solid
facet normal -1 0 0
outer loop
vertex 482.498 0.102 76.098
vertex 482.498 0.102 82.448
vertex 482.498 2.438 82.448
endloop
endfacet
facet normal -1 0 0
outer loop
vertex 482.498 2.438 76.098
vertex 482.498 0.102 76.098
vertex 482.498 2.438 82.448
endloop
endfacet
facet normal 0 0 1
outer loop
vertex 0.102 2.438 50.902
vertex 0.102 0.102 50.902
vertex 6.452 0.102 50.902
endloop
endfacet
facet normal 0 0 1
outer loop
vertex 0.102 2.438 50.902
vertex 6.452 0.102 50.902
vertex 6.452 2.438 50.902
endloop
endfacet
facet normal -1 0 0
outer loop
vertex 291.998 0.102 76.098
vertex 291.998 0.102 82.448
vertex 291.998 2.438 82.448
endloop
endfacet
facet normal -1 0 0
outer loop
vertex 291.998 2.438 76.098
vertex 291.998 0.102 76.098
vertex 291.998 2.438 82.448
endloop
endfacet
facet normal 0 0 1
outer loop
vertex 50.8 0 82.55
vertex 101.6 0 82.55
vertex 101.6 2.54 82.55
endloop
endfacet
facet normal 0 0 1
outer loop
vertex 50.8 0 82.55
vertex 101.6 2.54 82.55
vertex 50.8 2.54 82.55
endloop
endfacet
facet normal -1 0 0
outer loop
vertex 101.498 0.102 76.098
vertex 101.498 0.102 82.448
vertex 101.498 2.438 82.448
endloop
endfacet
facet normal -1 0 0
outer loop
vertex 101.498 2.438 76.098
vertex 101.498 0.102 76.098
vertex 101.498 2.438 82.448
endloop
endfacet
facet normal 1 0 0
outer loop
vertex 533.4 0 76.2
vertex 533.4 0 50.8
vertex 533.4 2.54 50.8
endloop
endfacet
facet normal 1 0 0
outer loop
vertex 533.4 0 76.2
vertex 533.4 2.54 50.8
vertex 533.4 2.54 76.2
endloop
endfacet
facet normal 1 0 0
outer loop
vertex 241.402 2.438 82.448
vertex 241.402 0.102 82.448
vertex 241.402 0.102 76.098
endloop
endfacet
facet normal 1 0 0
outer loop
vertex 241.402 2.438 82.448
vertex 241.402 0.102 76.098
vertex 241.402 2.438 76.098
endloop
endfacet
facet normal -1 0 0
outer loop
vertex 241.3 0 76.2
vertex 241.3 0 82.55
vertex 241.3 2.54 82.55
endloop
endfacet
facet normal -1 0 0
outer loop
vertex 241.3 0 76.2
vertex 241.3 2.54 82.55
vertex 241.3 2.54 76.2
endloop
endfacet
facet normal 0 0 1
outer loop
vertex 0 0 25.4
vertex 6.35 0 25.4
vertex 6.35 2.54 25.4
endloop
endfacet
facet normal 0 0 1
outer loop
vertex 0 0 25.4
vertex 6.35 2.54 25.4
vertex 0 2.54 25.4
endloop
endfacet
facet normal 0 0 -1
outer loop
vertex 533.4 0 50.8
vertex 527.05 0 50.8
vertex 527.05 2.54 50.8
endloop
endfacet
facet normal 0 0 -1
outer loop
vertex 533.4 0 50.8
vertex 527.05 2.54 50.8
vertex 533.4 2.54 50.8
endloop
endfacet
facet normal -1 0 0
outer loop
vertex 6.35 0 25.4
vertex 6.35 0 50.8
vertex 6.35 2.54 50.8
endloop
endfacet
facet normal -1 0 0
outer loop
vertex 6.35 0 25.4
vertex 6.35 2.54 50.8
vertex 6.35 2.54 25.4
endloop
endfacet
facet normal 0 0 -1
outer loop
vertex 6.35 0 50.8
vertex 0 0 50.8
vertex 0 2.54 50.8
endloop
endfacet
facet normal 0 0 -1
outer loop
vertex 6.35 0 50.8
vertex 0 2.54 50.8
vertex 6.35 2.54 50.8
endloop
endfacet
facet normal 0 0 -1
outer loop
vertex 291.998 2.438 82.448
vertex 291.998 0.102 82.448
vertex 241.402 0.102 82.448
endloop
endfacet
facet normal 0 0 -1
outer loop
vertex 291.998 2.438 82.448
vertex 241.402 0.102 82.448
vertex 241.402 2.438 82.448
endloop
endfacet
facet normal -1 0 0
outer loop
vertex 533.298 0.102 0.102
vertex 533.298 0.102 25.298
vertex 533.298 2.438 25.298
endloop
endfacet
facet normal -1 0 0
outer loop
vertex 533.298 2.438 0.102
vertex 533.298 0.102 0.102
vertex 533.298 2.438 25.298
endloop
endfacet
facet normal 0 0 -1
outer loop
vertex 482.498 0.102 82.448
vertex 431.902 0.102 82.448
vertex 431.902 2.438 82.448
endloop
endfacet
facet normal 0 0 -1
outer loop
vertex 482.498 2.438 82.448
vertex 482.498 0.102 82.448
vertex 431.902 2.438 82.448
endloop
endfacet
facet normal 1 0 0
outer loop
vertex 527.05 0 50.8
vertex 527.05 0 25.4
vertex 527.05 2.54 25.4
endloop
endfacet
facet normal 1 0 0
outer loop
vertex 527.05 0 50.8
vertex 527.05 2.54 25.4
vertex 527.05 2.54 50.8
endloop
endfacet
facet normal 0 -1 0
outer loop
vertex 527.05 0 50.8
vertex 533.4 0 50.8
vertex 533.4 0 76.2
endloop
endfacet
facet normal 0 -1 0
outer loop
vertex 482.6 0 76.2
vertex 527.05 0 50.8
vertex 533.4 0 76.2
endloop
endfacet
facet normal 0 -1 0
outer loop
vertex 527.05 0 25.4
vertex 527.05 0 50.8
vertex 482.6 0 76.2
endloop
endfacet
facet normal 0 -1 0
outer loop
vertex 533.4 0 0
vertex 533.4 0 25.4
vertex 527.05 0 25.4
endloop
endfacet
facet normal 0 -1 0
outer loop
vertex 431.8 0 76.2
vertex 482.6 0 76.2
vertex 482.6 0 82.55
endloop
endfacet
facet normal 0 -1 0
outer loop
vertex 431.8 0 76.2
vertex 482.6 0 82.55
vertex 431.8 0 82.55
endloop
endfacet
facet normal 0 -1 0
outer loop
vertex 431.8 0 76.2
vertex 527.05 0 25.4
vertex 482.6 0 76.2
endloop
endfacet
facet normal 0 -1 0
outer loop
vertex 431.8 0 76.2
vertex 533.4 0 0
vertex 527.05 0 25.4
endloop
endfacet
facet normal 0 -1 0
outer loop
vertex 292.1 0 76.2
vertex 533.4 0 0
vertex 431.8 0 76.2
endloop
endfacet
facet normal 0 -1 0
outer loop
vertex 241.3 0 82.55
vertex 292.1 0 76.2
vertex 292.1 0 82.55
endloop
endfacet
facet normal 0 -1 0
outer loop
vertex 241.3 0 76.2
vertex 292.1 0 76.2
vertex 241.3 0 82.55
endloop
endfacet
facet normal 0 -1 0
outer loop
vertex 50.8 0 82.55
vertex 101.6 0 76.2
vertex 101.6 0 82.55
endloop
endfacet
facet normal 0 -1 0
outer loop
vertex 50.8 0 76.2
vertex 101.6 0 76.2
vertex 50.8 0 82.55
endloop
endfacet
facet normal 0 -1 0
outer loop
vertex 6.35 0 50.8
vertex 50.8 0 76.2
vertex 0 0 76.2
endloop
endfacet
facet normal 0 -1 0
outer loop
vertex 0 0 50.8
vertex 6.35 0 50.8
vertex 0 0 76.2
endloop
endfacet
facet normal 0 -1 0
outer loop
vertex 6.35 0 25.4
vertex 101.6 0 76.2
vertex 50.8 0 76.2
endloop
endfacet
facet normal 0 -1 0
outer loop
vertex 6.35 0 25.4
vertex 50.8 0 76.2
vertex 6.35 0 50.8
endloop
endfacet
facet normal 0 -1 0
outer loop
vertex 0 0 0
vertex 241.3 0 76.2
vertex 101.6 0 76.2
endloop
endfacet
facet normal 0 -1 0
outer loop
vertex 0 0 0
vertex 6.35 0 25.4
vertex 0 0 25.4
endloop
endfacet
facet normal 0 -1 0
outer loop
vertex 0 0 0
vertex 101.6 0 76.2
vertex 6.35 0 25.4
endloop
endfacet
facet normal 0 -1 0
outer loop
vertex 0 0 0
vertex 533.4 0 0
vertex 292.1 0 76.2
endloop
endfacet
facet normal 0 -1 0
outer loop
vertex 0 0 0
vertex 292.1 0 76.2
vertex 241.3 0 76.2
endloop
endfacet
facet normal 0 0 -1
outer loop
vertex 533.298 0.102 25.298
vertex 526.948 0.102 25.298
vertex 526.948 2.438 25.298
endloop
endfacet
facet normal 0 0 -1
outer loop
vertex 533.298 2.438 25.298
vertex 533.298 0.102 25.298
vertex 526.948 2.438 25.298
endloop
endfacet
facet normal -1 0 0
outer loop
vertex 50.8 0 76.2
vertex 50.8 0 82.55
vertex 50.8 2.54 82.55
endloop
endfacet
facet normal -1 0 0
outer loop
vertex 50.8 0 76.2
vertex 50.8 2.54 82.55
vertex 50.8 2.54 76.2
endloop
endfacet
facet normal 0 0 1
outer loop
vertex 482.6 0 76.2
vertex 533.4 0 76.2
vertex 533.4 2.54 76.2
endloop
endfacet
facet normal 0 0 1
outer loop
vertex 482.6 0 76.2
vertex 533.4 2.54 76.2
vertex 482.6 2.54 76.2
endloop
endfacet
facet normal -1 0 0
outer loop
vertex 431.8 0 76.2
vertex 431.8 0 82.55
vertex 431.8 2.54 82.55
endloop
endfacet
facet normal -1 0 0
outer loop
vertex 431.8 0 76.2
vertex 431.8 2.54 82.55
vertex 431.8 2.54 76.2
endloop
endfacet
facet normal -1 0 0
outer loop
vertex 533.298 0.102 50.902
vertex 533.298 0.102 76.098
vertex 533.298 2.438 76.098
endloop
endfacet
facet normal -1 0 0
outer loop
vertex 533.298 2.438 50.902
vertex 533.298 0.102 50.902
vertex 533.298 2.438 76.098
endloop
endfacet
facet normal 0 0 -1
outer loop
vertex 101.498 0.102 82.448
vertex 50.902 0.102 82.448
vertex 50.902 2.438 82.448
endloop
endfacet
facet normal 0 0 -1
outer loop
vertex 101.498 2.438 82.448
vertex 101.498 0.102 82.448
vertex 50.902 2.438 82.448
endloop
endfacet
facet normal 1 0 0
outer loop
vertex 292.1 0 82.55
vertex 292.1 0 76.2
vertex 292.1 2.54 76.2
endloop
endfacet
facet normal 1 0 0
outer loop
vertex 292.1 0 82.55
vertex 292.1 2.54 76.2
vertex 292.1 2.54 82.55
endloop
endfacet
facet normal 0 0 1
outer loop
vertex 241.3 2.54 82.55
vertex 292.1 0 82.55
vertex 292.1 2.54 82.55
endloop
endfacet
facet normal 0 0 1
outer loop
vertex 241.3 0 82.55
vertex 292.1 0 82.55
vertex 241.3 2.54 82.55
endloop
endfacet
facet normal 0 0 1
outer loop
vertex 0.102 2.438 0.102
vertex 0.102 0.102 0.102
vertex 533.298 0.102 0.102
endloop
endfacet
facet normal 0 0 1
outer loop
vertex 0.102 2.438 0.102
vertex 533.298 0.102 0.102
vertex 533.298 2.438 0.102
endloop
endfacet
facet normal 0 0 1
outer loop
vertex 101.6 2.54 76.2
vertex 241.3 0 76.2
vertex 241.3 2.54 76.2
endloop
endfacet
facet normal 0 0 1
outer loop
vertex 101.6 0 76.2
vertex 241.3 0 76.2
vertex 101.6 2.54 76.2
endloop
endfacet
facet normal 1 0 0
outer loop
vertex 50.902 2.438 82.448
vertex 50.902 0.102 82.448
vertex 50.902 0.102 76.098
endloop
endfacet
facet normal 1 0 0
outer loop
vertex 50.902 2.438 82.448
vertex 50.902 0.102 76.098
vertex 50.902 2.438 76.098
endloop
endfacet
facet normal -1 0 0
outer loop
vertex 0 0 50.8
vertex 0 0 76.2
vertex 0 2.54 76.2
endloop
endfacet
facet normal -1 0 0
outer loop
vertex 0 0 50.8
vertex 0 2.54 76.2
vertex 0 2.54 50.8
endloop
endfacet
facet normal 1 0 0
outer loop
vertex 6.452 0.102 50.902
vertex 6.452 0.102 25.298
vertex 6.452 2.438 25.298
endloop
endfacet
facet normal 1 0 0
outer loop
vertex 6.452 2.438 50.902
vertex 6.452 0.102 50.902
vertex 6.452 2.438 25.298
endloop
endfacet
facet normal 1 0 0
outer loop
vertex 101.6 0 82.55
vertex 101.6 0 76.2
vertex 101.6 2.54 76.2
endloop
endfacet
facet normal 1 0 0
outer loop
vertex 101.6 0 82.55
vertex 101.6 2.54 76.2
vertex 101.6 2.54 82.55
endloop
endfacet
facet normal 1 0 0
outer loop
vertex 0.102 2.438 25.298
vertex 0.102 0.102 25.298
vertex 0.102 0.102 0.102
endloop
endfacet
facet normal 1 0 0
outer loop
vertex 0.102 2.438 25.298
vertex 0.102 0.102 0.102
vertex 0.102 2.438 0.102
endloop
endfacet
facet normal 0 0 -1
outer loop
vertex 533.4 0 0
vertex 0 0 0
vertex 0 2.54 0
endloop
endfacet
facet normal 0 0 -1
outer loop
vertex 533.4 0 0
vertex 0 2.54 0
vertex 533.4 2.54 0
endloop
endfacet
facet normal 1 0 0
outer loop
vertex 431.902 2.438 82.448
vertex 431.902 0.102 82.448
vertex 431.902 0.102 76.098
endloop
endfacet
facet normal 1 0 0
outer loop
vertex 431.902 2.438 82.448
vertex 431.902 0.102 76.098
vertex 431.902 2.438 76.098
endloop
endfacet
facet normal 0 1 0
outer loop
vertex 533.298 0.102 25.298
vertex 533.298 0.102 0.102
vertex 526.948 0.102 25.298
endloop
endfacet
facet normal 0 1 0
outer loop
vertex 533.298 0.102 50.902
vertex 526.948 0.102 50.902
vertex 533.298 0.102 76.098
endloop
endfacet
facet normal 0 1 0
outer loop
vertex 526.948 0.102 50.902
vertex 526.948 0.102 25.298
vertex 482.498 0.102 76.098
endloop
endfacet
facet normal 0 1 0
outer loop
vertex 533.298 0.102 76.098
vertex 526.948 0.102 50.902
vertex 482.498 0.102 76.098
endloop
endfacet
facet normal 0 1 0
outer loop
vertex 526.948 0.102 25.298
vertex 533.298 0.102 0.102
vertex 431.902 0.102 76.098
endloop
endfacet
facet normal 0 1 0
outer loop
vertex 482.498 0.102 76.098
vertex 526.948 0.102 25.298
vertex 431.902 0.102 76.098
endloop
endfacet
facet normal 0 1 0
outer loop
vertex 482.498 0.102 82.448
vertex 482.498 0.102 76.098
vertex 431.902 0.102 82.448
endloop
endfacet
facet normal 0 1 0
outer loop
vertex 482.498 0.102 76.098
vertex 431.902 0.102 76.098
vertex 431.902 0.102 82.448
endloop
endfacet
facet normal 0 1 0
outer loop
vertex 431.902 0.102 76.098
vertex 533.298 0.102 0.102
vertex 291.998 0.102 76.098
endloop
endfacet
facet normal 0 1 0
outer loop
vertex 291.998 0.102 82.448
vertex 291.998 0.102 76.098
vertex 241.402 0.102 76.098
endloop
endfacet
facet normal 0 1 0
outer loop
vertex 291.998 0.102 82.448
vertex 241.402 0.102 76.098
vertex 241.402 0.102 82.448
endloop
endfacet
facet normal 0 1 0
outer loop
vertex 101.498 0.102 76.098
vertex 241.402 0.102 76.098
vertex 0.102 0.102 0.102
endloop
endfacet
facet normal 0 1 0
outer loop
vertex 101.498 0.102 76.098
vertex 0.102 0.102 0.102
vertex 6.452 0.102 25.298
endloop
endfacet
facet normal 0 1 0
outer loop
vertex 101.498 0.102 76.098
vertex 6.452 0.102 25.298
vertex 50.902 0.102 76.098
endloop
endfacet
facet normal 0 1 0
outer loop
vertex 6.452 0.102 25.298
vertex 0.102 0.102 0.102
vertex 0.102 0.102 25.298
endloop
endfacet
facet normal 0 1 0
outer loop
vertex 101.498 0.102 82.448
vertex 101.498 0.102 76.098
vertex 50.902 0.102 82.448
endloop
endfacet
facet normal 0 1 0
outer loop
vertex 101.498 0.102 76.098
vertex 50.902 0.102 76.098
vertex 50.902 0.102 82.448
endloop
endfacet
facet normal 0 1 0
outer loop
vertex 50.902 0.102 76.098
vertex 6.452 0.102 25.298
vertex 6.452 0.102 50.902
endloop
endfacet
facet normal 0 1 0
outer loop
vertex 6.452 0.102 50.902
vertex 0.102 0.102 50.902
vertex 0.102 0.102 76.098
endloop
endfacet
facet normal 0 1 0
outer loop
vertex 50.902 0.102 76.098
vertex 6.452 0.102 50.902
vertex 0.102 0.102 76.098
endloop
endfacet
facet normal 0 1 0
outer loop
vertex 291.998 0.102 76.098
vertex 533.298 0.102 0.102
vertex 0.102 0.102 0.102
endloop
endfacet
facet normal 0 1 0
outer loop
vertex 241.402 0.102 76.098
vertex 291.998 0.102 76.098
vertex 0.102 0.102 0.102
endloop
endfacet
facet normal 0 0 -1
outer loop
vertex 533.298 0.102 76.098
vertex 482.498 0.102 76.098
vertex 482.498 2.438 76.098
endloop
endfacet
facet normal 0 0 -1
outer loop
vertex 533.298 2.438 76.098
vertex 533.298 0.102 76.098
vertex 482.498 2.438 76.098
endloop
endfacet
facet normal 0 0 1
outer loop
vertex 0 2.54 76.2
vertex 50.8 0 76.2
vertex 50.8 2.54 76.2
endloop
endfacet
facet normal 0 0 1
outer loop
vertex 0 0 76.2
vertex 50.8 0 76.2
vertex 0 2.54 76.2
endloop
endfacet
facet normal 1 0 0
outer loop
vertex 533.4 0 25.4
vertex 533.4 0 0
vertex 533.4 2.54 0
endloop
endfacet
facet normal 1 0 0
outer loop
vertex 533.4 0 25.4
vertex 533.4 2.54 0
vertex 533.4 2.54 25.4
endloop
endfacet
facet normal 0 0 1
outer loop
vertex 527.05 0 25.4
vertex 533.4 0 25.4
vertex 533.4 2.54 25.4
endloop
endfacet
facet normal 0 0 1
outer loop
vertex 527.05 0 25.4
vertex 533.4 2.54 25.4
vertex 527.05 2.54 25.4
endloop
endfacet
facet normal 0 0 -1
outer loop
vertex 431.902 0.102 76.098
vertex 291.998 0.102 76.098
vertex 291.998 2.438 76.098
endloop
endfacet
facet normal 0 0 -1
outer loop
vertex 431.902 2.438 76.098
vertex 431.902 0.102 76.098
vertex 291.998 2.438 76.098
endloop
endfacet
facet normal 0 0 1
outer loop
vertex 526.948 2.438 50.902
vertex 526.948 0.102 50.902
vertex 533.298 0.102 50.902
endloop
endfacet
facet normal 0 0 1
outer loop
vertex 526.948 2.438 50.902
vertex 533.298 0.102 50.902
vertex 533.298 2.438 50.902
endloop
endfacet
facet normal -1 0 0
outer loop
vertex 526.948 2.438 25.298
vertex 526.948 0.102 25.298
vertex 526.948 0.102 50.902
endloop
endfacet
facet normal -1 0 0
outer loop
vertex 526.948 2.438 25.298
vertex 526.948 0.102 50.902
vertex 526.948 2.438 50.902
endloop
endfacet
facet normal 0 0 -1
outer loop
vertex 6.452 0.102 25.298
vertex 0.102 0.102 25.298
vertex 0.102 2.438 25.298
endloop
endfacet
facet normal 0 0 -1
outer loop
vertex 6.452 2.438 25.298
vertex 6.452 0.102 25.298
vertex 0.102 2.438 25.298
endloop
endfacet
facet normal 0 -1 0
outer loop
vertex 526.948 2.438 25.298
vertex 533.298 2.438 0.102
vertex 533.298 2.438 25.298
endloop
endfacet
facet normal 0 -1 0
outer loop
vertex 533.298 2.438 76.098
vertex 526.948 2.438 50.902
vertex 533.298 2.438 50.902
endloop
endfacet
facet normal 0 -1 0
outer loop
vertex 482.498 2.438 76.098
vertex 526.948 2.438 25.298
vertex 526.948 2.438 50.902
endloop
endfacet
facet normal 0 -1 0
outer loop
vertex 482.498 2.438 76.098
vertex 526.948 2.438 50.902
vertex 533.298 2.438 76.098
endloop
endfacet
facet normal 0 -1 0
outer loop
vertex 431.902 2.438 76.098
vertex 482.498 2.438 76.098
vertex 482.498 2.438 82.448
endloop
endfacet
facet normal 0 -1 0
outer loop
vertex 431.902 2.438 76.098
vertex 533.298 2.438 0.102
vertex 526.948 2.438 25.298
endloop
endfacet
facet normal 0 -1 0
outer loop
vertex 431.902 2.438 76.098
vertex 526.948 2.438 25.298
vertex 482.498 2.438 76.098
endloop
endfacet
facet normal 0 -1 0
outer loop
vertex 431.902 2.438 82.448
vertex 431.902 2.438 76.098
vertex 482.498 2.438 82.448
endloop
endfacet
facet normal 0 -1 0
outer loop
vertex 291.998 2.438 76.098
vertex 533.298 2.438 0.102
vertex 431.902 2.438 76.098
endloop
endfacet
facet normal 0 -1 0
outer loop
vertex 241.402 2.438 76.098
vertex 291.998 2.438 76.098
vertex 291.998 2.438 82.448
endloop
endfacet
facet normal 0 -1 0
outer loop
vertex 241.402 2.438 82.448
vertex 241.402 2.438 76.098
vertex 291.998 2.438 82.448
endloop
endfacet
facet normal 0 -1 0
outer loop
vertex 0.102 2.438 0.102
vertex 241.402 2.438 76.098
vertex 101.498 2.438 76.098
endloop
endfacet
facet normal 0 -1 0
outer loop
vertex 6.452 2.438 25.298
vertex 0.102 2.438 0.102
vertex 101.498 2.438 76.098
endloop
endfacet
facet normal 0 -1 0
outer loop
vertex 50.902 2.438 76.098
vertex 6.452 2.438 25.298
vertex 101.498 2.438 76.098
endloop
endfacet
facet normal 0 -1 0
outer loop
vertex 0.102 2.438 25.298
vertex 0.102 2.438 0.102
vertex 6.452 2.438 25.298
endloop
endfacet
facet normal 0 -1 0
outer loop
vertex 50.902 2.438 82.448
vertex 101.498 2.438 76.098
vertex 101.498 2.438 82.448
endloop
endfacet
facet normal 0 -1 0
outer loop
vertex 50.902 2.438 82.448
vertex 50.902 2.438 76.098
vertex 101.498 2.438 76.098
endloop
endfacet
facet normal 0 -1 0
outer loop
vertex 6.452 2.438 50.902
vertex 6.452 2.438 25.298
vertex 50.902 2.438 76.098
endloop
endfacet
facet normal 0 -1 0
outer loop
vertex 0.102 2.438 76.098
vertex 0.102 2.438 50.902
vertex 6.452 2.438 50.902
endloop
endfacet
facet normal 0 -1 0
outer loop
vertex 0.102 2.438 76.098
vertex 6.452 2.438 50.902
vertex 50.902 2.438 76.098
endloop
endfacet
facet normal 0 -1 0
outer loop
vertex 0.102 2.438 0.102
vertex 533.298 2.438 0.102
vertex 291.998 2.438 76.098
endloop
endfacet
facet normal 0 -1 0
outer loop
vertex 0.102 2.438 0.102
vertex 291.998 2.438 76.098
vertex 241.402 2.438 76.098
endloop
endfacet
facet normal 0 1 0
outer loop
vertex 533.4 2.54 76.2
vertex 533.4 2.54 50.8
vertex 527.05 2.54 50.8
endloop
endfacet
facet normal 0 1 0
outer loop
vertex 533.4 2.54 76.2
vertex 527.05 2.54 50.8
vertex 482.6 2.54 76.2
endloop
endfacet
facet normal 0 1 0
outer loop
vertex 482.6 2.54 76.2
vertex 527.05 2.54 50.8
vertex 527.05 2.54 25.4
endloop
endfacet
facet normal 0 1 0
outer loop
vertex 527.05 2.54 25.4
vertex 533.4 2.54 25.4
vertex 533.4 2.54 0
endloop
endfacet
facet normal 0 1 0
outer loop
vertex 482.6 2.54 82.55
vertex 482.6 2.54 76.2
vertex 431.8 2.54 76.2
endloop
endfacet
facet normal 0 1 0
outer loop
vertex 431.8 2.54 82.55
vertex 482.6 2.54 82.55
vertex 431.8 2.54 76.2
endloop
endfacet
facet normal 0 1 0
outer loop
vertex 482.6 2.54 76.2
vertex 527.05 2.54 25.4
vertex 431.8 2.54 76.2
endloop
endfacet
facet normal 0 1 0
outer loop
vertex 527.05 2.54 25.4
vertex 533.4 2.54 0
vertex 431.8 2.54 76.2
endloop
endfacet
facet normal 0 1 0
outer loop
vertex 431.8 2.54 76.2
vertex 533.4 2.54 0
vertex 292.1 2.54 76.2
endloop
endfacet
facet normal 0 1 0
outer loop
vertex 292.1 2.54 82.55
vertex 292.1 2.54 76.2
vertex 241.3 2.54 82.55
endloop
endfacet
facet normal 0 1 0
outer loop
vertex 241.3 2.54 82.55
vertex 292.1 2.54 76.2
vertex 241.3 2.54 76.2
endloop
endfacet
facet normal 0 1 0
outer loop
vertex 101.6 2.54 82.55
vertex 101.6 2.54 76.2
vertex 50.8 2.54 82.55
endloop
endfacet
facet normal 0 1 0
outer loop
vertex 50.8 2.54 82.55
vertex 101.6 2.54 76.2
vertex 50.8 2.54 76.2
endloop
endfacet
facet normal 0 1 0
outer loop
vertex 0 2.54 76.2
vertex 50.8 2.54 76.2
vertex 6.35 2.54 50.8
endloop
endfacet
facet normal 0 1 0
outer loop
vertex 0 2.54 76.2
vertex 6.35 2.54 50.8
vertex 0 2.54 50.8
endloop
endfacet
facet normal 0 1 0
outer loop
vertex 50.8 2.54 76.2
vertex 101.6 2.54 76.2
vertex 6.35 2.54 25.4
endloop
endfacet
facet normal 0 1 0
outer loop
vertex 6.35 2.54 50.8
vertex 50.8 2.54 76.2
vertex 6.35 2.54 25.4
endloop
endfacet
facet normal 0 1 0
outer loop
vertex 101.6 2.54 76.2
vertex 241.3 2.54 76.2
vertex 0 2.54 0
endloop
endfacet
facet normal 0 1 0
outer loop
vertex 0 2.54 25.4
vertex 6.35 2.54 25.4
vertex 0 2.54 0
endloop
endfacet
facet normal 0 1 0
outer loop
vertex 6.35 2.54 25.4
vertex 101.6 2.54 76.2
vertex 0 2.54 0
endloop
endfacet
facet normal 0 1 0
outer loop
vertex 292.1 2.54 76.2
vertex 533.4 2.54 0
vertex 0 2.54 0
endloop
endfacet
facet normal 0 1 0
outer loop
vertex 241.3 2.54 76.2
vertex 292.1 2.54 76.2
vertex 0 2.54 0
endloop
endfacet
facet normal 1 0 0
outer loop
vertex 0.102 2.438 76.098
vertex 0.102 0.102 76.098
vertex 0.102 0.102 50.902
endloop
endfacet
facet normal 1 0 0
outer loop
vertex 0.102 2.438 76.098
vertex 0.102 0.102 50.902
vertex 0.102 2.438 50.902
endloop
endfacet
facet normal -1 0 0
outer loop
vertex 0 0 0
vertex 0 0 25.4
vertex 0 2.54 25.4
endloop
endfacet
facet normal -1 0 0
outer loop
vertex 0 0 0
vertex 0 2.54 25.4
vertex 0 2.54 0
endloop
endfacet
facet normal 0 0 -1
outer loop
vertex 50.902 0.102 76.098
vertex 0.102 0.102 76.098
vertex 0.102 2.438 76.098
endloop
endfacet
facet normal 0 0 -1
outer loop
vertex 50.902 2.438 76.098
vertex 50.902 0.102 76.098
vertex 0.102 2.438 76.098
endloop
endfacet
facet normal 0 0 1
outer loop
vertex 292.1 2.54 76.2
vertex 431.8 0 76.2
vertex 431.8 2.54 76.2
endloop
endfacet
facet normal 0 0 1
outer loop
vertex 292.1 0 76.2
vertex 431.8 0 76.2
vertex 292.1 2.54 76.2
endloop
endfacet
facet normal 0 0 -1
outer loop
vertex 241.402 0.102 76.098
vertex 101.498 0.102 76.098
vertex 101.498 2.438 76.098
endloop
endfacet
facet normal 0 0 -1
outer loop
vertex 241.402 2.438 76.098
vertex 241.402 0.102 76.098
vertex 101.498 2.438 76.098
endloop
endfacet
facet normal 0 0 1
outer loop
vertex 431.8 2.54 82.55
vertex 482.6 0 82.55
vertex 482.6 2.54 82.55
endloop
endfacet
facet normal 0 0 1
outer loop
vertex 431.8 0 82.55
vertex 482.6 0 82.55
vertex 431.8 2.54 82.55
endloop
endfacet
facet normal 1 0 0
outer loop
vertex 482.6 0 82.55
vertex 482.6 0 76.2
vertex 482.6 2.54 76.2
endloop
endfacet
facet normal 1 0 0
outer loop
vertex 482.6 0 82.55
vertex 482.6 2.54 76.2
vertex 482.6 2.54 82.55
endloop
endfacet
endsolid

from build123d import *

# Parameters (mm, degrees)
BOSS_EXTRUDE1_DEPTH = 2.54
SHELL1_START        = 6.4516
SHELL1_OUTLINE_W    = 2.3368
SHELL1_OUTLINE_H    = 75.9968
SHELL1_DEPTH        = 520.4968
SHELL1_START_2      = 0.1016
SHELL1_2_OUTLINE_W  = 2.3368
SHELL1_2_OUTLINE_H  = 25.1968
SHELL1_2_DEPTH      = 533.1968
SHELL1_START_3      = 50.9016
SHELL1_3_OUTLINE_W  = 2.3368
SHELL1_3_OUTLINE_H  = 6.35
SHELL1_3_DEPTH      = 50.5968
SHELL1_START_4      = 241.4016
SHELL1_4_OUTLINE_W  = 2.3368
SHELL1_4_OUTLINE_H  = 6.35
SHELL1_4_DEPTH      = 50.5968
SHELL1_START_5      = 431.9016
SHELL1_5_OUTLINE_W  = 2.3368
SHELL1_5_OUTLINE_H  = 6.35
SHELL1_5_DEPTH      = 50.5968


# Read off the part's stored shape, not the designer's step: Shell1
with BuildPart() as part:
    # Sketch1 → Boss-Extrude1 (new body)
    with BuildSketch(Plane(origin=(0, 0, 0), x_dir=(1, 0, 0), z_dir=(0, 1, 0))):
        Polygon((292.1, -76.2), (292.1, -82.55), (241.3, -82.55), (241.3, -76.2), (101.6, -76.2), (101.6, -82.55), (50.8, -82.55), (50.8, -76.2), (0, -76.2), (0, -50.8), (6.35, -50.8), (6.35, -25.4), (0, -25.4), (0, 0), (533.4, 0), (533.4, -25.4), (527.05, -25.4), (527.05, -50.8), (533.4, -50.8), (533.4, -76.2), (482.6, -76.2), (482.6, -82.55), (431.8, -82.55), (431.8, -76.2), align=None)
    extrude(amount=BOSS_EXTRUDE1_DEPTH)

    # Shell1 outline → Shell1 (cut)
    with BuildSketch(Plane.YZ.offset(SHELL1_START)):
        with Locations((1.27, 38.1)):
            Rectangle(SHELL1_OUTLINE_W, SHELL1_OUTLINE_H)
    extrude(amount=SHELL1_DEPTH, mode=Mode.SUBTRACT)

    # Shell1 2 outline → Shell1 2 (cut)
    with BuildSketch(Plane.YZ.offset(SHELL1_START_2)):
        with Locations((1.27, 63.5)):
            Rectangle(SHELL1_2_OUTLINE_W, SHELL1_2_OUTLINE_H)
        with Locations((1.27, 12.7)):
            Rectangle(SHELL1_2_OUTLINE_W, SHELL1_2_OUTLINE_H)
    extrude(amount=SHELL1_2_DEPTH, mode=Mode.SUBTRACT)

    # Shell1 3 outline → Shell1 3 (cut)
    with BuildSketch(Plane.YZ.offset(SHELL1_START_3)):
        with Locations((1.27, 79.2734)):
            Rectangle(SHELL1_3_OUTLINE_W, SHELL1_3_OUTLINE_H)
    extrude(amount=SHELL1_3_DEPTH, mode=Mode.SUBTRACT)

    # Shell1 4 outline → Shell1 4 (cut)
    with BuildSketch(Plane.YZ.offset(SHELL1_START_4)):
        with Locations((1.27, 79.2734)):
            Rectangle(SHELL1_4_OUTLINE_W, SHELL1_4_OUTLINE_H)
    extrude(amount=SHELL1_4_DEPTH, mode=Mode.SUBTRACT)

    # Shell1 5 outline → Shell1 5 (cut)
    with BuildSketch(Plane.YZ.offset(SHELL1_START_5)):
        with Locations((1.27, 79.2734)):
            Rectangle(SHELL1_5_OUTLINE_W, SHELL1_5_OUTLINE_H)
    extrude(amount=SHELL1_5_DEPTH, mode=Mode.SUBTRACT)


solid = part.part
